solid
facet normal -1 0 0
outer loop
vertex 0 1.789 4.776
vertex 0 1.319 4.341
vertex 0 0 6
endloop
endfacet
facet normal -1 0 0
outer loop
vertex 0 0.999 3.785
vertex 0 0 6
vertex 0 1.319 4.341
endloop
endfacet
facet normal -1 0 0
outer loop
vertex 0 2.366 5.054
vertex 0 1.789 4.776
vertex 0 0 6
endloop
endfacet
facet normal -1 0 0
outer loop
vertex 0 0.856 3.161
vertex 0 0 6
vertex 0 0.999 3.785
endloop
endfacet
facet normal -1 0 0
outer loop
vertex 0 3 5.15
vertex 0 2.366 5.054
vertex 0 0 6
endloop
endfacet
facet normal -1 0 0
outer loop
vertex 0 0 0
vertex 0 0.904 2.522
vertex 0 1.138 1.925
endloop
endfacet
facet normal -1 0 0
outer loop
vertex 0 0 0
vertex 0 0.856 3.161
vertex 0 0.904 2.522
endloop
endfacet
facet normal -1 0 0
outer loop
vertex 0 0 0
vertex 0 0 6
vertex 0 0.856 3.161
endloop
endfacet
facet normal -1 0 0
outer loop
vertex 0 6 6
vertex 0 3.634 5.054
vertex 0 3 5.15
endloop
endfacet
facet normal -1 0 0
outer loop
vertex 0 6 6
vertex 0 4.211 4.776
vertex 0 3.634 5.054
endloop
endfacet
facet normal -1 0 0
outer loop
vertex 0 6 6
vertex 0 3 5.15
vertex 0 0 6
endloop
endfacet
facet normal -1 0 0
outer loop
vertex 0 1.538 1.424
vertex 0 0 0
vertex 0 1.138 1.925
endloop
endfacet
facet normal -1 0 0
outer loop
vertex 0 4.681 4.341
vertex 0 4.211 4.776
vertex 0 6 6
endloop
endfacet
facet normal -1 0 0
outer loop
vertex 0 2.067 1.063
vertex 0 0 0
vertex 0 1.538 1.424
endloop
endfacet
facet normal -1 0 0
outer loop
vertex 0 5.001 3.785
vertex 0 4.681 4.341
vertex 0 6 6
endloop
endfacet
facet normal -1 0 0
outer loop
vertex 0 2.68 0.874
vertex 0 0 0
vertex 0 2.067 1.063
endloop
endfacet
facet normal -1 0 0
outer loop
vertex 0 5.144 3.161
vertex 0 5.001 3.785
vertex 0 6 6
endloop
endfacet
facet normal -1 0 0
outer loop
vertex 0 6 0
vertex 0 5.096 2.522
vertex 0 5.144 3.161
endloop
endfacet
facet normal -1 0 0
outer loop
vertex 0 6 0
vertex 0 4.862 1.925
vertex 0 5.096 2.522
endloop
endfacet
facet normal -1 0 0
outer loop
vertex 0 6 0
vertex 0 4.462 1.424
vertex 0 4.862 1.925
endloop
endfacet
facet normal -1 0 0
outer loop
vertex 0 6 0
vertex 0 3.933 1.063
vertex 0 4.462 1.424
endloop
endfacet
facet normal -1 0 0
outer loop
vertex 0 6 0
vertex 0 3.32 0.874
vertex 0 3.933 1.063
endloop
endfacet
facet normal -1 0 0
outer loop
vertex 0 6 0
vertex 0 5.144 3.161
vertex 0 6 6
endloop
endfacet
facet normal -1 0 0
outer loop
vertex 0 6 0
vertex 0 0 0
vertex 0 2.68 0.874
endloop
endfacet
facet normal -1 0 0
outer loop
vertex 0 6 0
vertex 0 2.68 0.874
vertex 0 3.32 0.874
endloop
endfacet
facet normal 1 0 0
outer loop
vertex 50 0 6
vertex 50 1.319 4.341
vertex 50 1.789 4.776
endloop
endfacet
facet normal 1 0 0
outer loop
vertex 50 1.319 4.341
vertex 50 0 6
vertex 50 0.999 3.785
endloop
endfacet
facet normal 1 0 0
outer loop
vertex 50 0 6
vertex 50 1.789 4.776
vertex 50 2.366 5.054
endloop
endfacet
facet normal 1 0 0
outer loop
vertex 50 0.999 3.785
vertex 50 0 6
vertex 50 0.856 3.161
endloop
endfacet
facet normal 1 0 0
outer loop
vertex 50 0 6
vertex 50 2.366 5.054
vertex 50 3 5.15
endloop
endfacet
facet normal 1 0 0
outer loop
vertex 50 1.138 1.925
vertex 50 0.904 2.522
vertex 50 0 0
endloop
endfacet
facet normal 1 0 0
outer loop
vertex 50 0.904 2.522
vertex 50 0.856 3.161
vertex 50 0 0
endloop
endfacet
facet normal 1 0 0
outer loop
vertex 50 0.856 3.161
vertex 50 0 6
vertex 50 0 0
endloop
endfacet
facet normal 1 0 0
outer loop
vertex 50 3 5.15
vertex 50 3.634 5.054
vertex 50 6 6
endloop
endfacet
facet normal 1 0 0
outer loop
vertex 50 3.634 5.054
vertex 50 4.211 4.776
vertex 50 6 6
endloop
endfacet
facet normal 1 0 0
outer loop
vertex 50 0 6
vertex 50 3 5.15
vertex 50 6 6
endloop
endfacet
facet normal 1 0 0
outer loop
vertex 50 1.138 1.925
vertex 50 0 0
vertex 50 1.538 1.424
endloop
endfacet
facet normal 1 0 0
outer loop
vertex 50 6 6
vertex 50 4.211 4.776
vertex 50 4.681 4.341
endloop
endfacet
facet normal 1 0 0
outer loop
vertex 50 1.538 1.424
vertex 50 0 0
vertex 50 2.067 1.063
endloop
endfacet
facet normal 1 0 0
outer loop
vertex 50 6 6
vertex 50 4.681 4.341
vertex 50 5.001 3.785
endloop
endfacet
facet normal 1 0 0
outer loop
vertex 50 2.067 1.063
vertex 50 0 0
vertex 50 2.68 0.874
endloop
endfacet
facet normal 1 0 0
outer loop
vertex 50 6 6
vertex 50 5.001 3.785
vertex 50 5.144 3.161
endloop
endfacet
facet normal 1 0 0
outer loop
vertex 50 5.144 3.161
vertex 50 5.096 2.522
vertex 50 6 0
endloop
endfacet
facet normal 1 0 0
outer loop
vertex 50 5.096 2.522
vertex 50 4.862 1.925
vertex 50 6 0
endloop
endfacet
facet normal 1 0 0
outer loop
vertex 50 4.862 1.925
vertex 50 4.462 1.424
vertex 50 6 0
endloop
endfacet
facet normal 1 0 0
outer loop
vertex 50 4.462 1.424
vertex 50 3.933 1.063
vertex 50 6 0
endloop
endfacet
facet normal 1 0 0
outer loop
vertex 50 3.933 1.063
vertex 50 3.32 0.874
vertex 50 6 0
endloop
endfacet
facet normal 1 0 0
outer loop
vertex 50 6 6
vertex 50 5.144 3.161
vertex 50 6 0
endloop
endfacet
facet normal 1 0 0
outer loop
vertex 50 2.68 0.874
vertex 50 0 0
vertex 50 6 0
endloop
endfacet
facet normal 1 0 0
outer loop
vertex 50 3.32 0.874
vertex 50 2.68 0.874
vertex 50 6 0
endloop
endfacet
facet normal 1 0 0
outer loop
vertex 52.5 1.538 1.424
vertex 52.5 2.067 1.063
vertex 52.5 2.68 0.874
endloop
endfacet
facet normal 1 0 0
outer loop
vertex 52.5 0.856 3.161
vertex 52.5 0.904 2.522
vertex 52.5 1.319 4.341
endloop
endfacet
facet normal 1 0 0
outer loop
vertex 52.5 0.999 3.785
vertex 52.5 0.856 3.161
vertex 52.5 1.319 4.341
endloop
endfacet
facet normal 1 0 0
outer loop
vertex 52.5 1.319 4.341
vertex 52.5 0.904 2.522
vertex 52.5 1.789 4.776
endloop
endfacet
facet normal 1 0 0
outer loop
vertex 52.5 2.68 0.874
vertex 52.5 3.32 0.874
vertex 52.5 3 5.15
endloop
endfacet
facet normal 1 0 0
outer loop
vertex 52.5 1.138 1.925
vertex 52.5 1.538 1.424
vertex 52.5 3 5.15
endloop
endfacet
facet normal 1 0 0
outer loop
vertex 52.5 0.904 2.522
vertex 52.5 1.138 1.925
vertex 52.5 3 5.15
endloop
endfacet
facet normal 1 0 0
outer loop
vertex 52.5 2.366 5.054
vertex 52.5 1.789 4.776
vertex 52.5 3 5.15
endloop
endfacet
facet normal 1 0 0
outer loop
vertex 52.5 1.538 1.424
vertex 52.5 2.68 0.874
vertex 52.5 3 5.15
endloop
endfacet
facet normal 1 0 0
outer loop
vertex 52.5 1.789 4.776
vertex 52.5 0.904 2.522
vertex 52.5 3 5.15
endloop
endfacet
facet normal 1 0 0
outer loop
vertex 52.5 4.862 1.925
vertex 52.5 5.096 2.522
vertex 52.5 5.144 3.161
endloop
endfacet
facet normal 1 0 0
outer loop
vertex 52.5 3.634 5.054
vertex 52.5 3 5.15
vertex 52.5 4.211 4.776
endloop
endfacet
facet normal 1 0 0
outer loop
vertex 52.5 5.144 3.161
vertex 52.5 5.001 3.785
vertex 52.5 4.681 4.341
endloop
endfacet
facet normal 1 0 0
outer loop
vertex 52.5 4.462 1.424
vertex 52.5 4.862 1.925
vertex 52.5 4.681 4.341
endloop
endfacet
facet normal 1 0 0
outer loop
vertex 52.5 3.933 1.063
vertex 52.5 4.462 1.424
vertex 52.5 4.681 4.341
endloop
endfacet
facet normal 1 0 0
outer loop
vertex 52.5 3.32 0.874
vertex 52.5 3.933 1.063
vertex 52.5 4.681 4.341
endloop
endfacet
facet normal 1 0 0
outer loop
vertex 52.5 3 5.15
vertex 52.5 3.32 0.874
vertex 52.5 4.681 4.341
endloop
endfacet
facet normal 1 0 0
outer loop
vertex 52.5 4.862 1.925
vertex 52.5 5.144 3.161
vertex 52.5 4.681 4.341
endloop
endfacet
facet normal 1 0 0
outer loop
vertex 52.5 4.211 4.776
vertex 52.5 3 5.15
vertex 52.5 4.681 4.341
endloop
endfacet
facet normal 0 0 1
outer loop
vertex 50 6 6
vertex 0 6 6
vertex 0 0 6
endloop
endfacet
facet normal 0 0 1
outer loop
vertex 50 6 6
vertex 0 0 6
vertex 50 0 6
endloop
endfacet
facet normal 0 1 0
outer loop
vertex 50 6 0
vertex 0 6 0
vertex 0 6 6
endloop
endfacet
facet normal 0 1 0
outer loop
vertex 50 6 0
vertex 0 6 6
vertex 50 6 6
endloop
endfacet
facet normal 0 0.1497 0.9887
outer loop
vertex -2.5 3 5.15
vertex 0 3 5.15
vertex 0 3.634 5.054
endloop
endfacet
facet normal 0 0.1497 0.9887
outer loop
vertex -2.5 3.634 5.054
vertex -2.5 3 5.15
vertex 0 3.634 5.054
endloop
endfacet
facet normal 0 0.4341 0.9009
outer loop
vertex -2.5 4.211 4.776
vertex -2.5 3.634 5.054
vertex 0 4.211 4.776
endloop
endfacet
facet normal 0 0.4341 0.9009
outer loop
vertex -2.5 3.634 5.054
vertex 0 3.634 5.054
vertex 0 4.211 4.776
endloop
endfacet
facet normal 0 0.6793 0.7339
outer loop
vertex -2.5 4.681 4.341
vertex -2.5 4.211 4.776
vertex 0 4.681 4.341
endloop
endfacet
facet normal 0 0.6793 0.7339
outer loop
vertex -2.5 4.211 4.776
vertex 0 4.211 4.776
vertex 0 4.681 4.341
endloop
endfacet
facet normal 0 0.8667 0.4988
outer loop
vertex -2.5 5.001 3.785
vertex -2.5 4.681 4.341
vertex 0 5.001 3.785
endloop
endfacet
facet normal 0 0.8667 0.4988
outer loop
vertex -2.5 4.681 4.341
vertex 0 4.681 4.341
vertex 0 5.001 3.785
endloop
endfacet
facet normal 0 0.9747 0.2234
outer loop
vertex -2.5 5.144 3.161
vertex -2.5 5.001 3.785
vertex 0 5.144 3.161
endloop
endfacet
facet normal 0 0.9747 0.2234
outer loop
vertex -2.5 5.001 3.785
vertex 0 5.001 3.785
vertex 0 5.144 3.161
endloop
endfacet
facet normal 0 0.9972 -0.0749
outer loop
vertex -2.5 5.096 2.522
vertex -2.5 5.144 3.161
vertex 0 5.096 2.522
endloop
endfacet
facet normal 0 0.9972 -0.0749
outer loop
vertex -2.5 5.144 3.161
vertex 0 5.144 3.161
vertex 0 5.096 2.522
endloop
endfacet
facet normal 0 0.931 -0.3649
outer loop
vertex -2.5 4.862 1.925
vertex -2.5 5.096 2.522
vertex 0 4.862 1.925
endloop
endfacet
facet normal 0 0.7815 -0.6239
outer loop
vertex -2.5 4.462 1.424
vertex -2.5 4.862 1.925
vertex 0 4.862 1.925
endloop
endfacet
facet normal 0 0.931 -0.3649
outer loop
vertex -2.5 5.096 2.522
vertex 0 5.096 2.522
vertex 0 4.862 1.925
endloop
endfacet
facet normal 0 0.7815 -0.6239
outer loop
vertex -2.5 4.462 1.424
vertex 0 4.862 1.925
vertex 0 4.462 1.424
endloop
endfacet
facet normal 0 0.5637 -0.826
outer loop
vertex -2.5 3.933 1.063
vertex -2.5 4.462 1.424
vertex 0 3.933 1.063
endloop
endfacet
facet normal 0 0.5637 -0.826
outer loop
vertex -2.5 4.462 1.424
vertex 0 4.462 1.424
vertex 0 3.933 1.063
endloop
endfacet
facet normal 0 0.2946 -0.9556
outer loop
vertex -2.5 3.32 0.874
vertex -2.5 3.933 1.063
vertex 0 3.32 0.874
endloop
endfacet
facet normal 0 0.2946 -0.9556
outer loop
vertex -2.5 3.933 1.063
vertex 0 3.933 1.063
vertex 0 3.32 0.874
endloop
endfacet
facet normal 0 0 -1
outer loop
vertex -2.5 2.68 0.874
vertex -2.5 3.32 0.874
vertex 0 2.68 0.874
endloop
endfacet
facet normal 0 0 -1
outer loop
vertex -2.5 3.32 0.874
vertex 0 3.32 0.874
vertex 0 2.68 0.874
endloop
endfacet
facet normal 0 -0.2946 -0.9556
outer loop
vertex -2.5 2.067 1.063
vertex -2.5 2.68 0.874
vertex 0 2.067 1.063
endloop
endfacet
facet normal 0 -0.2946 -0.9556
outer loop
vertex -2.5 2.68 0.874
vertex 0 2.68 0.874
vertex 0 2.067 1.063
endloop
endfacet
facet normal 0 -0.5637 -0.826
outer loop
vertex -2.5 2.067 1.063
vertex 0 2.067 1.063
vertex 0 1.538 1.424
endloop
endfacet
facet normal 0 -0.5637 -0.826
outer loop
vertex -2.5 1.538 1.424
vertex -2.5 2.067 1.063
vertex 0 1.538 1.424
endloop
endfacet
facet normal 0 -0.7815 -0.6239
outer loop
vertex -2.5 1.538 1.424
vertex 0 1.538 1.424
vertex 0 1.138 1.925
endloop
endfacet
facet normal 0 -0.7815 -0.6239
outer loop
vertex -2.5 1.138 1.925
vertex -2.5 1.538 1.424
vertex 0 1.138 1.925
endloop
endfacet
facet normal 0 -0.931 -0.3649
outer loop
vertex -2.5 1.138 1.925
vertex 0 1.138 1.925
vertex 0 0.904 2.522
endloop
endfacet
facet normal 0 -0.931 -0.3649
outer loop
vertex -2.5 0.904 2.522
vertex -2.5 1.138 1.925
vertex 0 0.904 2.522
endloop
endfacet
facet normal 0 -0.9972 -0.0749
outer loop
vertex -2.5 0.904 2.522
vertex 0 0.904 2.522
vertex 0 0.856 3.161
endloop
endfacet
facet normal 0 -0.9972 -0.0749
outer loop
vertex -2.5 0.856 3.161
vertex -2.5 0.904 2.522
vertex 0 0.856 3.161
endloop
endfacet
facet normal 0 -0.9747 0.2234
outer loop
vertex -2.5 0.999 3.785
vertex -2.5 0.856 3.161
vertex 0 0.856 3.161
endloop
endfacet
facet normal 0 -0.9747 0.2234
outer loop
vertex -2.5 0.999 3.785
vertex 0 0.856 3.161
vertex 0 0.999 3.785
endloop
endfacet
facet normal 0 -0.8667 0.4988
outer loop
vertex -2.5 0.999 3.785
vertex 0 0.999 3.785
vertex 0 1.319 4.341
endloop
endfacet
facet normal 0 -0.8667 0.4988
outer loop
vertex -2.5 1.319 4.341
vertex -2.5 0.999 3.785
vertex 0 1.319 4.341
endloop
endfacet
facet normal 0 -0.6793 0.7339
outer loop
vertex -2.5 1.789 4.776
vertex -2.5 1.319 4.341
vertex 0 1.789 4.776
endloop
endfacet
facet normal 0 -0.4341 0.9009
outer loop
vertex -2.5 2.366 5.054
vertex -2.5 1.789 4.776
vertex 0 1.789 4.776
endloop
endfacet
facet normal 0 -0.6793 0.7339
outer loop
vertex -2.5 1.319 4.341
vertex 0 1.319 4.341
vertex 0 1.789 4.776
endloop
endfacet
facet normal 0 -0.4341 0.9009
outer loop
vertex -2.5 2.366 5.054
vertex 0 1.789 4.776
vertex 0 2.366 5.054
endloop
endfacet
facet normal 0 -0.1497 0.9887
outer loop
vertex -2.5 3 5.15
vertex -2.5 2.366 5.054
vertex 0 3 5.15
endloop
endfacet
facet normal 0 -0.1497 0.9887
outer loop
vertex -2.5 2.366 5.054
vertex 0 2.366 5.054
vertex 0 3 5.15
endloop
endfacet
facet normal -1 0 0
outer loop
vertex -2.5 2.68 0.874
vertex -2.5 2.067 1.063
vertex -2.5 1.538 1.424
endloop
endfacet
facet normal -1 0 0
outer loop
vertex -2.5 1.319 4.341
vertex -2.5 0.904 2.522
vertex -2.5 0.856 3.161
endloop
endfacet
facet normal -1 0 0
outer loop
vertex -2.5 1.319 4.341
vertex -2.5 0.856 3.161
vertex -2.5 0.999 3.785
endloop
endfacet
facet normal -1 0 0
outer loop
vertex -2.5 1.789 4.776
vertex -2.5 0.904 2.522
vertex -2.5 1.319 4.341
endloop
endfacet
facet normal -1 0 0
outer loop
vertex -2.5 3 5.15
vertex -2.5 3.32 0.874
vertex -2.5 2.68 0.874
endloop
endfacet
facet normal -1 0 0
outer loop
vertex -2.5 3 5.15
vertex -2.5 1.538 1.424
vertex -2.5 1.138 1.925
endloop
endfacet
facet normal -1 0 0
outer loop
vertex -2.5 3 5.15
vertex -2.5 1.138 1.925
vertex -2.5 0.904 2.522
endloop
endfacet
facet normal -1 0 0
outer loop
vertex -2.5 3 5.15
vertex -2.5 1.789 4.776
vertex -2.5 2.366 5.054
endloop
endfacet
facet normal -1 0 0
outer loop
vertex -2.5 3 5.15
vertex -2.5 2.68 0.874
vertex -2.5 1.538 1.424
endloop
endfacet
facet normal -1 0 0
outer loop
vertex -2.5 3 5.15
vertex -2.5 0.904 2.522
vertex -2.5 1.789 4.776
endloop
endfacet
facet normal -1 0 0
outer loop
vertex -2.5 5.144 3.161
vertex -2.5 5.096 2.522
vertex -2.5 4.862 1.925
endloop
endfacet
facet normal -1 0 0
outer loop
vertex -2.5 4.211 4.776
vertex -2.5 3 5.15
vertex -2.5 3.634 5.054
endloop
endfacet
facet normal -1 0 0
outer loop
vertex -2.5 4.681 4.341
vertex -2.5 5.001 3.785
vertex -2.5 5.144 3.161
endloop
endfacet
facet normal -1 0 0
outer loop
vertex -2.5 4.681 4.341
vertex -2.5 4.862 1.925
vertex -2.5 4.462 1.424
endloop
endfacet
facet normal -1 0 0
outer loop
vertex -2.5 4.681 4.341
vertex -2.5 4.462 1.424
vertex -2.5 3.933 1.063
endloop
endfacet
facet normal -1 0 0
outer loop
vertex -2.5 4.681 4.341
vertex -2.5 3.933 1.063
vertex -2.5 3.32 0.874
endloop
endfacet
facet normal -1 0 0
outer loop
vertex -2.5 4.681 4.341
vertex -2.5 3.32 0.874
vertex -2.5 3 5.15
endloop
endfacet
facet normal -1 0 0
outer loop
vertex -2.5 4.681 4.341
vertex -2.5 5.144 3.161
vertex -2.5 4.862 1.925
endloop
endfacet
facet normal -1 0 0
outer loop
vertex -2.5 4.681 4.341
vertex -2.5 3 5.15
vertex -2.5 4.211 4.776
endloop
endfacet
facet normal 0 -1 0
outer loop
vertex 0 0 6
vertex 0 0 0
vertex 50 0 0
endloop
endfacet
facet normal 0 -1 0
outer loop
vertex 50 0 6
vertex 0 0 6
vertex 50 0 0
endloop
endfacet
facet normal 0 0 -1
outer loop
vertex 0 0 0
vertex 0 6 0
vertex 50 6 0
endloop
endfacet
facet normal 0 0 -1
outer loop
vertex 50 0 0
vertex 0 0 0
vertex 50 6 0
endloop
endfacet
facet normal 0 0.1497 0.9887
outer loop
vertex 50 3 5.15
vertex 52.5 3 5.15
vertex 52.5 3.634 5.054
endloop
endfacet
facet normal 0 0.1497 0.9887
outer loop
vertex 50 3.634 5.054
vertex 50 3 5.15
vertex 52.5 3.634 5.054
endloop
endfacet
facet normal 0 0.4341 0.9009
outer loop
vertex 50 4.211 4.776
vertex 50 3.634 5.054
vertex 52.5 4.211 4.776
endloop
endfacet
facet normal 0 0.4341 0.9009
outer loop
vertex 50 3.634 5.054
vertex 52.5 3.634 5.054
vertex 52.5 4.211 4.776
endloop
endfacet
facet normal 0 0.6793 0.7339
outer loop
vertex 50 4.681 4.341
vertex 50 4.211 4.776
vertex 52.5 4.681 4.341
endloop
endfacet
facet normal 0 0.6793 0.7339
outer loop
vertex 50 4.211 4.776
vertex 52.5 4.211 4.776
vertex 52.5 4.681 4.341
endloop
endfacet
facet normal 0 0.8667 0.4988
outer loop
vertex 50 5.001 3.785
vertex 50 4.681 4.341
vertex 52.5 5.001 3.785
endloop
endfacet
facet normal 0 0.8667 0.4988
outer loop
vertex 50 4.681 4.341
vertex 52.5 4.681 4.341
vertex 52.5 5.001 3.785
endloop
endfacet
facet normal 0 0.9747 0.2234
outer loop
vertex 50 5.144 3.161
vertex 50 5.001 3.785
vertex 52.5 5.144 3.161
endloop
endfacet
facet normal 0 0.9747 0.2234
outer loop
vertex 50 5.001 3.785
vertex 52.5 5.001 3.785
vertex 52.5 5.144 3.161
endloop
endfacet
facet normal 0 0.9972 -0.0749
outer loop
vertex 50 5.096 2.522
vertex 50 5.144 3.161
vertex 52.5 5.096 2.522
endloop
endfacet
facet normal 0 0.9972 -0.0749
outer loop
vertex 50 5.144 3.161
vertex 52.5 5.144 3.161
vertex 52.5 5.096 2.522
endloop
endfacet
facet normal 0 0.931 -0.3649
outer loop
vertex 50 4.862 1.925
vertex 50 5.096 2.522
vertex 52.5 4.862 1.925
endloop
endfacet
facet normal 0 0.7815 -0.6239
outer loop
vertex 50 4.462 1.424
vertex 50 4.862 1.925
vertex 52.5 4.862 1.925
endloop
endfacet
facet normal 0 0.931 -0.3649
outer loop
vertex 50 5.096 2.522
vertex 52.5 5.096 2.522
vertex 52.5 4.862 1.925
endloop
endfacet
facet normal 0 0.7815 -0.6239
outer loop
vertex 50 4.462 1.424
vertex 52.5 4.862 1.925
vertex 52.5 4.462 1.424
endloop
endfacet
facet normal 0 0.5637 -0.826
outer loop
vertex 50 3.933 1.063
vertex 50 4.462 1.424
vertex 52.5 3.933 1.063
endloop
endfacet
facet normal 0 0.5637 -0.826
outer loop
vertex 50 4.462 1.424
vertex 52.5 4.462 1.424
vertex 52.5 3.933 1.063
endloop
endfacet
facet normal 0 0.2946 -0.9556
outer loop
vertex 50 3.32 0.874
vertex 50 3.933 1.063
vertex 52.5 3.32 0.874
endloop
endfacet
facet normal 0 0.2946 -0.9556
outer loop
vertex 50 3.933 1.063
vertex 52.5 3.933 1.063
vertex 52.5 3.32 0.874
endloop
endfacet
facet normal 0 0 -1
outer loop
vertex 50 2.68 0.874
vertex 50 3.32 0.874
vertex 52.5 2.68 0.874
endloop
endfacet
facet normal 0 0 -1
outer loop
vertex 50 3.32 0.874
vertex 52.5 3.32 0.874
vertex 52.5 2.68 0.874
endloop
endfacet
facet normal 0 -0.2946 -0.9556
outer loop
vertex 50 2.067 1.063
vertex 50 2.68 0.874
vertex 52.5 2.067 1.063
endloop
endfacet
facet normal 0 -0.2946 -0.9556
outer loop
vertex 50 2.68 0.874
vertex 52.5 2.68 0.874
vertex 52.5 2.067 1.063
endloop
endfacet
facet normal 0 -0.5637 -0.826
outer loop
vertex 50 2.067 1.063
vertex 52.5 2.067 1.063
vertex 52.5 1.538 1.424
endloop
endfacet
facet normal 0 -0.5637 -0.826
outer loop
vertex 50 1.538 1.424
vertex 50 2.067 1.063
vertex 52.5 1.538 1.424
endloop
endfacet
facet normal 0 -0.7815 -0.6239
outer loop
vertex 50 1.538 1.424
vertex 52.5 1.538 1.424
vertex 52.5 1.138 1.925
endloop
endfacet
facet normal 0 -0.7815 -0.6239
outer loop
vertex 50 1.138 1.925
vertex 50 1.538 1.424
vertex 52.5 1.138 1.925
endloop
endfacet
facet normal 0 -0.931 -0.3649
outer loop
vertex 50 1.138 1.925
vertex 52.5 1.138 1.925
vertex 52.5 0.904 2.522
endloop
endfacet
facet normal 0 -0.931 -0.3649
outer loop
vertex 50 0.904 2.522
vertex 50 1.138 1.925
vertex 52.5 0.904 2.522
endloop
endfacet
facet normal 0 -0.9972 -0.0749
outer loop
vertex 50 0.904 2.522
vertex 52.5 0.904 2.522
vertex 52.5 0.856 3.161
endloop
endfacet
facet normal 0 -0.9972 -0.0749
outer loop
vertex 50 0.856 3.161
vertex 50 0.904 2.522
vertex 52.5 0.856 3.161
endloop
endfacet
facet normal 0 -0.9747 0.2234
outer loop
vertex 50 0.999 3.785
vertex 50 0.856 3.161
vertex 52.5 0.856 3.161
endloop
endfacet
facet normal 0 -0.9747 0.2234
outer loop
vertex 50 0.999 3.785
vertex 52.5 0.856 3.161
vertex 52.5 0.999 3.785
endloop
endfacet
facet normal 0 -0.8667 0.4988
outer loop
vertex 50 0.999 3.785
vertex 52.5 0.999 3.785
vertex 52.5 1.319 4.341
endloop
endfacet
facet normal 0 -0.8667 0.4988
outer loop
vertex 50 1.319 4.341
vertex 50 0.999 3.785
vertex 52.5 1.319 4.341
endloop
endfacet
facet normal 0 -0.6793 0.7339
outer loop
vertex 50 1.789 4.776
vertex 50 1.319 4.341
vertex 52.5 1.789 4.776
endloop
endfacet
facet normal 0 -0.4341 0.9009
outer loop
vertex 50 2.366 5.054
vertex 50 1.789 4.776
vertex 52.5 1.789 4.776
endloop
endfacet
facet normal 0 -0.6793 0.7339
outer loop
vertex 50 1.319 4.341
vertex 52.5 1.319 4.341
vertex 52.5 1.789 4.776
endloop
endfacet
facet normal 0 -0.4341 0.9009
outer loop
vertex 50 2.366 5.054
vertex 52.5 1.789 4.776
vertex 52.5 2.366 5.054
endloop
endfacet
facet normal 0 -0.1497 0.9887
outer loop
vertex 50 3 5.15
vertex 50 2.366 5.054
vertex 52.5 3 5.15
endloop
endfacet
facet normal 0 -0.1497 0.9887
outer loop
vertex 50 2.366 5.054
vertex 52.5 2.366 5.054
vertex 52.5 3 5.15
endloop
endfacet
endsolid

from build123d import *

# Parameters (mm, degrees)
SKETCH_1_W             = 50
SKETCH_1_H             = 6
EXTRUDE_1_DEPTH        = 6
SKETCH_2_R             = 2.15
EXTRUDE_2_DEPTH        = 2.5
PATTERN_LINEAR_1_COUNT = 2
PATTERN_LINEAR_1_PITCH = 52.5


with BuildPart() as part:
    # 草圖1 → 填料-伸長1 (new body)
    with BuildSketch(Plane.XY):
        with Locations((25, 3)):
            Rectangle(SKETCH_1_W, SKETCH_1_H)
    extrude(amount=EXTRUDE_1_DEPTH)

    # 草圖2 → 填料-伸長2 (add)
    with BuildSketch(Plane.ZY):
        with Locations((3, 3)):
            Circle(SKETCH_2_R)
    extrude_2 = extrude(amount=EXTRUDE_2_DEPTH)

    # 直線複製排列1: 填料-伸長2 ×2
    with Locations(*[(i * PATTERN_LINEAR_1_PITCH, 0, 0) for i in range(1, PATTERN_LINEAR_1_COUNT)]):
        add(extrude_2)


solid = part.part
